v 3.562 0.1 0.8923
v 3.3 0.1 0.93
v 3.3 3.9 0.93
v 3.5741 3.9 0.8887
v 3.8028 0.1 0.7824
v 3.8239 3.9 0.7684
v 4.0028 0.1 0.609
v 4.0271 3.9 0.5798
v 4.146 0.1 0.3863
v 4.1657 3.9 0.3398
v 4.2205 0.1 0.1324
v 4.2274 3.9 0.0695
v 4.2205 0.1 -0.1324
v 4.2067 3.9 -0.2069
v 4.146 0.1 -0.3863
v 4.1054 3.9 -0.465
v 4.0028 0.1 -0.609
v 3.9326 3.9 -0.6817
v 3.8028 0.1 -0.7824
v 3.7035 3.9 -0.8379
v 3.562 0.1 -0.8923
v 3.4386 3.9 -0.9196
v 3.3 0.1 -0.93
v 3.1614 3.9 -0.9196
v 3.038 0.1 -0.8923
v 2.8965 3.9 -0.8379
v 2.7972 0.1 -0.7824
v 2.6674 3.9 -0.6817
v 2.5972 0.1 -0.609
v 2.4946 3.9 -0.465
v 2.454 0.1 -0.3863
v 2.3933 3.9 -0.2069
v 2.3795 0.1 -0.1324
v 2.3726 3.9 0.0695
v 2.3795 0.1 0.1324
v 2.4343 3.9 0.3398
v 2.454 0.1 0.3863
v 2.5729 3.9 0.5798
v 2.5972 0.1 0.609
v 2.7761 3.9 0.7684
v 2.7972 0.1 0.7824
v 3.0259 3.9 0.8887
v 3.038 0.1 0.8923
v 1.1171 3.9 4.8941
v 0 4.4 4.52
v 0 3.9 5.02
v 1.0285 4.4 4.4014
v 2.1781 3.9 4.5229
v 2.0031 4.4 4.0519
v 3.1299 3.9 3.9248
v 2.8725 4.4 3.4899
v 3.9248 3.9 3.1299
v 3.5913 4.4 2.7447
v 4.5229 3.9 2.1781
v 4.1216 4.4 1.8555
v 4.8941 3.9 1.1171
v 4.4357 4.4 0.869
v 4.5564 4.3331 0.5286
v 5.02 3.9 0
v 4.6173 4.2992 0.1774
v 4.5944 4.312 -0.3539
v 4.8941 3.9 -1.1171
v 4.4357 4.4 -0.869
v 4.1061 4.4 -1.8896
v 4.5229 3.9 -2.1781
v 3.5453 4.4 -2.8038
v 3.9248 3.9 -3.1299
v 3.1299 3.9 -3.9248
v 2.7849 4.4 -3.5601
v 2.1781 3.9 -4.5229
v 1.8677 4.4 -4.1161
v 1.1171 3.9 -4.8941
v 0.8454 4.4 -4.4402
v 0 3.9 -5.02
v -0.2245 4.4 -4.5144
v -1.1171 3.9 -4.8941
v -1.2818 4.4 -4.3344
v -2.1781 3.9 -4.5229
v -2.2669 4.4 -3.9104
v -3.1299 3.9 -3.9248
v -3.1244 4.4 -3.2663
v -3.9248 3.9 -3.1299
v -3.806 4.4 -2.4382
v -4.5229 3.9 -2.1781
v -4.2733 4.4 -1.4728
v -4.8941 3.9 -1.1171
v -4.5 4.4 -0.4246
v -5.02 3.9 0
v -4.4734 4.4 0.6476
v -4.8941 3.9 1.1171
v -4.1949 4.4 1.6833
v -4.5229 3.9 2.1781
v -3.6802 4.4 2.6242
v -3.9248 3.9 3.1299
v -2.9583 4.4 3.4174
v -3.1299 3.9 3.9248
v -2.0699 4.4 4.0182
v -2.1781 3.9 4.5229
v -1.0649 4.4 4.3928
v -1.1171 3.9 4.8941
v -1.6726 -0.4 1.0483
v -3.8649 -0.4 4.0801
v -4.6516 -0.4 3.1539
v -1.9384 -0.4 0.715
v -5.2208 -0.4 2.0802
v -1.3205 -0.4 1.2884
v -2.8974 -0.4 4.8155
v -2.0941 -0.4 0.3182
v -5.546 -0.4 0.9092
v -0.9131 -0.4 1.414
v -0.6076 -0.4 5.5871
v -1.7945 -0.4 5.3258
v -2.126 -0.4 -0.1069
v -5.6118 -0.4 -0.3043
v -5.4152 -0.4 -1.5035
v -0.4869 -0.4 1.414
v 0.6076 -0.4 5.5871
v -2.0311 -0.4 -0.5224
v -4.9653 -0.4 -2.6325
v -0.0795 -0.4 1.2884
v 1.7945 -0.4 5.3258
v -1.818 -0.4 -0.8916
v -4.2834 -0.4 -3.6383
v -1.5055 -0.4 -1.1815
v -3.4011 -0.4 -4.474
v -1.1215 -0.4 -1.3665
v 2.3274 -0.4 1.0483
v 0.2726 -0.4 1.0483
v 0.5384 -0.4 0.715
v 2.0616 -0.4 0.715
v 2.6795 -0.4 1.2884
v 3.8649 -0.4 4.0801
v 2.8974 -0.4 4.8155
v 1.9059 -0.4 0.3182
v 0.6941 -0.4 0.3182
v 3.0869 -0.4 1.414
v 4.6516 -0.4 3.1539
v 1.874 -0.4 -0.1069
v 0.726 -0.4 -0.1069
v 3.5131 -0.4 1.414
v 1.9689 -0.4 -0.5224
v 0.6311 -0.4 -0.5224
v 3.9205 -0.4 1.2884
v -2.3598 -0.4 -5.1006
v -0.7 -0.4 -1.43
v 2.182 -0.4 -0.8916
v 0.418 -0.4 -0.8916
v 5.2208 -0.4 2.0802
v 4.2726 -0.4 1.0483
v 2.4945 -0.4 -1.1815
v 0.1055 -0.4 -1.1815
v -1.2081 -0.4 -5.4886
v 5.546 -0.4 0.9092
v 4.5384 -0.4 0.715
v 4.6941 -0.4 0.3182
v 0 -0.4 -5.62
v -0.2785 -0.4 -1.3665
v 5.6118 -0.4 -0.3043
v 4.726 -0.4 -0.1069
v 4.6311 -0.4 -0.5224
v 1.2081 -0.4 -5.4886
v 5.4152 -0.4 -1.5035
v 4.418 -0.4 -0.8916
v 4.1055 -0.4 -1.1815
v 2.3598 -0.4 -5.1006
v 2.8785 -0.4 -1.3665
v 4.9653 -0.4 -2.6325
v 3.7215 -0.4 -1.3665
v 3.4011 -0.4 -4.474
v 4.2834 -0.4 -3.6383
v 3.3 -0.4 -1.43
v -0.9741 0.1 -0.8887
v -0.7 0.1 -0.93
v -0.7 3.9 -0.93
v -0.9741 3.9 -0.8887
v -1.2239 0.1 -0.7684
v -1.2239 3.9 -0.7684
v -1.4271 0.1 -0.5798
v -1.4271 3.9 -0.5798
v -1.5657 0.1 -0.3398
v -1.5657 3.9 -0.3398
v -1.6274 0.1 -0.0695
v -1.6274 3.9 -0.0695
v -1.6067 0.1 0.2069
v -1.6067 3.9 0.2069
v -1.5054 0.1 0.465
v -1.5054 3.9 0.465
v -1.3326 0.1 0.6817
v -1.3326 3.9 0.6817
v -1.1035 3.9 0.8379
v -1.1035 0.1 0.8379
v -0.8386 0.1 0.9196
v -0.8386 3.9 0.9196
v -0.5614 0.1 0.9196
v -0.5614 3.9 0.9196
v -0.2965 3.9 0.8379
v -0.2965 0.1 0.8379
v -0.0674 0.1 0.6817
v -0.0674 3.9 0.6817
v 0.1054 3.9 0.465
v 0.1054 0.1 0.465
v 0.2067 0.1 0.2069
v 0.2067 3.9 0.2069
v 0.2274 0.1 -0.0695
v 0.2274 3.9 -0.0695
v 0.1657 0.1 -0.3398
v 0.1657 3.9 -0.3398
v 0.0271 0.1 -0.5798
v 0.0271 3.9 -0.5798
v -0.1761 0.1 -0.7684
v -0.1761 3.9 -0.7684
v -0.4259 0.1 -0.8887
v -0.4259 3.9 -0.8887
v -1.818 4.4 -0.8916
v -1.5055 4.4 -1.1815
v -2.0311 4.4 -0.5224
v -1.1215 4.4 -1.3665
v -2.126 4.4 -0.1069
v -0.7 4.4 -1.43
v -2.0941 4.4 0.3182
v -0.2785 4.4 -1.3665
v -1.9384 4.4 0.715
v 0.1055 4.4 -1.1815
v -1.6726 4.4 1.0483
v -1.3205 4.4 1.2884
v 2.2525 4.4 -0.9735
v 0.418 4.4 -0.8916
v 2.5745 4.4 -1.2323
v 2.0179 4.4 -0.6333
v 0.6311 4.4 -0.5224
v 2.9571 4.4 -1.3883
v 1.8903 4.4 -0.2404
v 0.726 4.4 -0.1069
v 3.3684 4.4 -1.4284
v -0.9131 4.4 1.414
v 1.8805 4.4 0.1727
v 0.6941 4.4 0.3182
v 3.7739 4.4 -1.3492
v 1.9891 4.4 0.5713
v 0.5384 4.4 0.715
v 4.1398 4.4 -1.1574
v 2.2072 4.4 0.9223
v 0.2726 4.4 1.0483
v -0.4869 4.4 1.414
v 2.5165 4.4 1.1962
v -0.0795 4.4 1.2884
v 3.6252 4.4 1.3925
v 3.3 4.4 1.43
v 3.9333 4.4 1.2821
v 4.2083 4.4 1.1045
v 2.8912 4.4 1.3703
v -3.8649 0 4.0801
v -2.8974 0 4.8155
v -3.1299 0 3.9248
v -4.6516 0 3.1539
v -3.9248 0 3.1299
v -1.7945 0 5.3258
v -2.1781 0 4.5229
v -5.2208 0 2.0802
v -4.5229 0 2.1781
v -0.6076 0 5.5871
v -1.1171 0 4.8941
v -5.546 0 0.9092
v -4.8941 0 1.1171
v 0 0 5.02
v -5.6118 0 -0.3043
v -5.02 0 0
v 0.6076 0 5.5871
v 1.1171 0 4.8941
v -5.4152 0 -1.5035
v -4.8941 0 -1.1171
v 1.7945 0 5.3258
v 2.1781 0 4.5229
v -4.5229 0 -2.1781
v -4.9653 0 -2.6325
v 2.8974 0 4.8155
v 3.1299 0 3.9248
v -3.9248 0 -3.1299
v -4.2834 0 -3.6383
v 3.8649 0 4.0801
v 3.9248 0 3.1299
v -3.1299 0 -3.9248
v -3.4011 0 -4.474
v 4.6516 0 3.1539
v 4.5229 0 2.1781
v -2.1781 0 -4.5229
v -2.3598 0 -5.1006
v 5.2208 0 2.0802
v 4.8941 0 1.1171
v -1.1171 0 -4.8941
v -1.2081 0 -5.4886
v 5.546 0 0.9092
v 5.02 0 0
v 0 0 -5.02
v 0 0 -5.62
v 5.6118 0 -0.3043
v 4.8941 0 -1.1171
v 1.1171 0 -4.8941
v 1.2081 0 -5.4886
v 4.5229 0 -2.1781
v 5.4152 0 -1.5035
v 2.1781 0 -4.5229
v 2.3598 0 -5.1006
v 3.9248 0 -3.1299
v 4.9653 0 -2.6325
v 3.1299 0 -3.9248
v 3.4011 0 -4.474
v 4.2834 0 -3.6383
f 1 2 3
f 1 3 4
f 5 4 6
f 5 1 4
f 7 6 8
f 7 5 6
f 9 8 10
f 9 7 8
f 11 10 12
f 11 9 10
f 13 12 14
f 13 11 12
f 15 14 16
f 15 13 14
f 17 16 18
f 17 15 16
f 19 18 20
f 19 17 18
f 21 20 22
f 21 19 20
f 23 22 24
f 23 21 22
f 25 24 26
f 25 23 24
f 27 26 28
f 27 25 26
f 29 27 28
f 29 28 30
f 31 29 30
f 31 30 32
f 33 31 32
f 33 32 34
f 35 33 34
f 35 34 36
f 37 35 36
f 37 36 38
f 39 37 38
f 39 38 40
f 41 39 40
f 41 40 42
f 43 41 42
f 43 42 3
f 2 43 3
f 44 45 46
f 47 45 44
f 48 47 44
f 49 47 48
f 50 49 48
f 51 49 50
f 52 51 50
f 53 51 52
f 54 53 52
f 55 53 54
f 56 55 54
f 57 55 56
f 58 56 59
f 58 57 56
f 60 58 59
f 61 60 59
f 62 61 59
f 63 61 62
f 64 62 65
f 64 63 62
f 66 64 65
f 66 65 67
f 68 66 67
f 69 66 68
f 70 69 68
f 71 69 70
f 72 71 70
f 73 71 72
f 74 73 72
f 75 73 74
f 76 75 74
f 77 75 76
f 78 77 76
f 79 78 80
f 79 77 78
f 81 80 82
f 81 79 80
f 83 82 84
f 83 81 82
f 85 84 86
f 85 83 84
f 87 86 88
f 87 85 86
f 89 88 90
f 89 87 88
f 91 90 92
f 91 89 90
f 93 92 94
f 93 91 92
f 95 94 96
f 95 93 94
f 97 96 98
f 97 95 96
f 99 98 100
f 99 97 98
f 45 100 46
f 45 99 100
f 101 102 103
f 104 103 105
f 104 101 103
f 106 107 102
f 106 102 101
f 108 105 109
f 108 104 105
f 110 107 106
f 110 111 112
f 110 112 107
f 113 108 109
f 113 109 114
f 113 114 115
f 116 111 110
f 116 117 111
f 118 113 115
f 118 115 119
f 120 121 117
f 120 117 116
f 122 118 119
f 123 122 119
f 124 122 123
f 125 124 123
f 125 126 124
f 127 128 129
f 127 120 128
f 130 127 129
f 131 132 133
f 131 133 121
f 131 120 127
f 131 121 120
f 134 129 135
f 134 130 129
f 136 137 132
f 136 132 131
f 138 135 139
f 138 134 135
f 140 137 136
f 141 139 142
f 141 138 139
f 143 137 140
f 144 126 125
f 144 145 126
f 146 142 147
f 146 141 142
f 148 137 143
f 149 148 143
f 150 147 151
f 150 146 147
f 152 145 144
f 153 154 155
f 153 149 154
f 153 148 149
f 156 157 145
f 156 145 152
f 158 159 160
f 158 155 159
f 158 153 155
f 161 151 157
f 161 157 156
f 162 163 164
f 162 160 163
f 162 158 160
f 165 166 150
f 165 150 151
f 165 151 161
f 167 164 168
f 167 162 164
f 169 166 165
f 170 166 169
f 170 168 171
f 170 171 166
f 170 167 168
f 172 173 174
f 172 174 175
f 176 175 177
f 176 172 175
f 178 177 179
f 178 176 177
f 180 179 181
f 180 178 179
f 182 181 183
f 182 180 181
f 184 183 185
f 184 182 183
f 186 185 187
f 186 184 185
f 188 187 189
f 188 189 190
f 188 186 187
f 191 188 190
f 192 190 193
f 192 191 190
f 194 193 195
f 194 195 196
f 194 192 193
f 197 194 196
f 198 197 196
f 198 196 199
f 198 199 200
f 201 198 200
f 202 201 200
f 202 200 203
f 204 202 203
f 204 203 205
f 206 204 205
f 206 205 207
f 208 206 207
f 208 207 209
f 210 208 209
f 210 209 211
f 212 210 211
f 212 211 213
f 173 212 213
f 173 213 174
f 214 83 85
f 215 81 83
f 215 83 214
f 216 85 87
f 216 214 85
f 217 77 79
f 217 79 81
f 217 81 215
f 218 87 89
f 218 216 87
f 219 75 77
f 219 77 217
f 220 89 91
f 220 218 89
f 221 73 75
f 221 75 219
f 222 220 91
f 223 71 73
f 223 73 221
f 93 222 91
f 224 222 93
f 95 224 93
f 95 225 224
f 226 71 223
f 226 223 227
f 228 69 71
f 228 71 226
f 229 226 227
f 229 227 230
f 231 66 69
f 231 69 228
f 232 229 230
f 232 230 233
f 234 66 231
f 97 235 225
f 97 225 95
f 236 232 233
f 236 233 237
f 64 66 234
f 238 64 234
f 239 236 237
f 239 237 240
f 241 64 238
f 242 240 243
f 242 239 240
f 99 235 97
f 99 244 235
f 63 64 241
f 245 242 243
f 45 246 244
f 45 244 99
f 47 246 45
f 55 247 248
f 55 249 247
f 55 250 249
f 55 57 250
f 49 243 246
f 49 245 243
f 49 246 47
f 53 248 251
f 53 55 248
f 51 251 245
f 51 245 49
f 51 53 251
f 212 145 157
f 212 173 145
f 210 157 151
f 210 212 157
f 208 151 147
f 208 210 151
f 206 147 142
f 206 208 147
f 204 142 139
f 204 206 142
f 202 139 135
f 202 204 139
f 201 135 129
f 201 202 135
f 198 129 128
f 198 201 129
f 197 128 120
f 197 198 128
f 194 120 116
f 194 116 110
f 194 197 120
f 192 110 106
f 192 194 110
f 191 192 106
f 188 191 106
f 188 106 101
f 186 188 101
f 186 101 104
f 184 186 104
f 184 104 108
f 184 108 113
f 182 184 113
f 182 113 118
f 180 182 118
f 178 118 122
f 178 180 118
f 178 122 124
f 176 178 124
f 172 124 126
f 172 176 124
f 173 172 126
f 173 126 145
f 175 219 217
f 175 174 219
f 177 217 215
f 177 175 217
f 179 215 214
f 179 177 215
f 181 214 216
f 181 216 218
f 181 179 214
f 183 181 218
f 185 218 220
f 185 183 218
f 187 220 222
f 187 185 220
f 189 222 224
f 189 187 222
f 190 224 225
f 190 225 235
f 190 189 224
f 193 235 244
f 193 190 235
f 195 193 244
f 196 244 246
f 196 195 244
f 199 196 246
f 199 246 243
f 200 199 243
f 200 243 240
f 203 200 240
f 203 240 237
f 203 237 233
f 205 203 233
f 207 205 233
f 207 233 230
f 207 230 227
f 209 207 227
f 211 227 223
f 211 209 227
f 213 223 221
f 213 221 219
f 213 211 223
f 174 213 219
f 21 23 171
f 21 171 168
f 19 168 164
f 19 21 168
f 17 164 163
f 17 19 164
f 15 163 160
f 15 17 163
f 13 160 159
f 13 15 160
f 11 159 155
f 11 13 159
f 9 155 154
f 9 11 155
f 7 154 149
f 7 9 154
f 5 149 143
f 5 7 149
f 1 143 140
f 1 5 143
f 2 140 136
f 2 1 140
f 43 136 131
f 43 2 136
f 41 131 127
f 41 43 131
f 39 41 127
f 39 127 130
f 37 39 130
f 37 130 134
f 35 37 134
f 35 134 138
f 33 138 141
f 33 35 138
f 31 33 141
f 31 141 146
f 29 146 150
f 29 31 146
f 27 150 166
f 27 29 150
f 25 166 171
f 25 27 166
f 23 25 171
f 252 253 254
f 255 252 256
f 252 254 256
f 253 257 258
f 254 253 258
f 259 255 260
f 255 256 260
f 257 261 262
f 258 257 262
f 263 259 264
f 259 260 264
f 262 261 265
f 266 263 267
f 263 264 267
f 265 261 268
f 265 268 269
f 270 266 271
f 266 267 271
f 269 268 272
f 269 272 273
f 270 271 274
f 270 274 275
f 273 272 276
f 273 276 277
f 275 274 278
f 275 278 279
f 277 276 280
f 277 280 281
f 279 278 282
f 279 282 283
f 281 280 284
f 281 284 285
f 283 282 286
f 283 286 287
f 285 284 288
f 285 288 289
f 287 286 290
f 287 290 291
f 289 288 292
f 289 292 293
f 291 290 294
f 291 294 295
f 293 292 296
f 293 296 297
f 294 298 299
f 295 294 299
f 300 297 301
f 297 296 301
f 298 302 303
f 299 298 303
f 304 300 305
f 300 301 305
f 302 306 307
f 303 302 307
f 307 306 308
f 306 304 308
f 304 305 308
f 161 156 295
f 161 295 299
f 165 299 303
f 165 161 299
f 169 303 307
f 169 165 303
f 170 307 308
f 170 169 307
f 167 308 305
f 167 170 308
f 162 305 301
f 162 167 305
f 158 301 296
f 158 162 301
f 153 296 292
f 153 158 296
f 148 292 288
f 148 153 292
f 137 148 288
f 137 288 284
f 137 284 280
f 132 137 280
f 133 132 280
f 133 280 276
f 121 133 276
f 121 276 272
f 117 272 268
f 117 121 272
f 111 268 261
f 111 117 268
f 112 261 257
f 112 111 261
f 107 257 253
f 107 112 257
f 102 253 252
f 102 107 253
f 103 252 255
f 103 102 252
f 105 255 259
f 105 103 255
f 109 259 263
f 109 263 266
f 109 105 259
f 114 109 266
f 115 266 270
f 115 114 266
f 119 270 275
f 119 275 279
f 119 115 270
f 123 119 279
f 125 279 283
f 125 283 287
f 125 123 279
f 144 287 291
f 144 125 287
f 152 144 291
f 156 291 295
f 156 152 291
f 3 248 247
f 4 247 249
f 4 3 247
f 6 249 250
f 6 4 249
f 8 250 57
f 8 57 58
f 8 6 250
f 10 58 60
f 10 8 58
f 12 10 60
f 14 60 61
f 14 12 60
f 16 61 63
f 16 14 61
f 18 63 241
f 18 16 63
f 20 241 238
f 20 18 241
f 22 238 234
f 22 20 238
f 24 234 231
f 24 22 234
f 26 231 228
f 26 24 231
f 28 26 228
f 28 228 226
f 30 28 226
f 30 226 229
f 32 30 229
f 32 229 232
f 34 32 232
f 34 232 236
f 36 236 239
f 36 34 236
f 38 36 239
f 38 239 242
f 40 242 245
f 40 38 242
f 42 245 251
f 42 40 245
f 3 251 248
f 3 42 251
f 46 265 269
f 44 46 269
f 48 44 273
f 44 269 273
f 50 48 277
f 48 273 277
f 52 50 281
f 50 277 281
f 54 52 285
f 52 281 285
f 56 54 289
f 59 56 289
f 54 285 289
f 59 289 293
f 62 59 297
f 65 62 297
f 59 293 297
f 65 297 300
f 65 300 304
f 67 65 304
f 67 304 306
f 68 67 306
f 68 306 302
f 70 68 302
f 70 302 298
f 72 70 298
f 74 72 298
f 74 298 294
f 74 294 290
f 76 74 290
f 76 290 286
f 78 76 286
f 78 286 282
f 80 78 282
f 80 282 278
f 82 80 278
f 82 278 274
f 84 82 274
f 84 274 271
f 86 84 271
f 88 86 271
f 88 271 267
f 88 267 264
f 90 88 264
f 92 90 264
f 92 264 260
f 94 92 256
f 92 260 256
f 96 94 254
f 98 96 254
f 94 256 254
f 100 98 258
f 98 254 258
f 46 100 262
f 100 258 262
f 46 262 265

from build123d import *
from build123d.topology import SkipClean

# Parameters (mm, degrees)
SKETCH_1_R      = 5.02
SKETCH_1_R_2    = 0.93
EXTRUDE_1_DEPTH = 4.4
EXTRUDE_START   = 0.4
SKETCH_3_R      = 5.62
SKETCH_3_R_2    = 0.93
EXTRUDE_2_DEPTH = 0.4
CHAMFER_1_SIZE  = 0.5


with BuildPart() as part:
    # 草图1 → 凸台-拉伸1 (new body)
    with BuildSketch(Plane(origin=(0, 0, 0), x_dir=(1, 0, 0), z_dir=(0, 1, 0))):
        with Locations(Location((0, 0, 0), (0, 0, 270))):
            Circle(SKETCH_1_R)
        with Locations(Location((3.3, 0, 0), (0, 0, 270))):
            Circle(SKETCH_1_R_2, mode=Mode.SUBTRACT)
        with Locations(Location((-0.7, 0, 0), (0, 0, 90))):
            Circle(SKETCH_1_R_2, mode=Mode.SUBTRACT)
    extrude(amount=EXTRUDE_1_DEPTH)

    # 草图3 → 凸台-拉伸2 (add)
    with SkipClean():  # the faces are left unmerged after this step: merging them gives an invalid solid
        with BuildSketch(Plane.XZ.offset(EXTRUDE_START)):
            with Locations(Location((0, 0, 0), (0, 0, 270))):
                Circle(SKETCH_3_R)
            with Locations(Location((3.3, 0, 0), (0, 0, 270))):
                Circle(SKETCH_3_R_2, mode=Mode.SUBTRACT)
            with Locations(Location((-0.7, 0, 0), (0, 0, 270))):
                Circle(SKETCH_3_R_2, mode=Mode.SUBTRACT)
        extrude(amount=-EXTRUDE_2_DEPTH)

    # 倒角1
    # the kernel refuses this chamfer: 0.5 mm, written as the material it takes off along each edge
    with BuildSketch(Plane(origin=(3.3, -0.4, 0), x_dir=(0, 0, -1), z_dir=(-1, 0, 0))) as chamfer_1_piece_1:
        Polygon((0.93 + CHAMFER_1_SIZE, 0), (0.93, -CHAMFER_1_SIZE), (0.93, 0), align=None)
    revolve(axis=Axis((3.3, -0.4, 0), (0, -1, 0)), mode=Mode.SUBTRACT)
    with BuildSketch(Plane(origin=(-0.7, -0.4, 0), x_dir=(0, 0, -1), z_dir=(-1, 0, 0))) as chamfer_1_piece_2:
        Polygon((0.93 + CHAMFER_1_SIZE, 0), (0.93, -CHAMFER_1_SIZE), (0.93, 0), align=None)
    revolve(axis=Axis((-0.7, -0.4, 0), (0, -1, 0)), mode=Mode.SUBTRACT)
    with BuildSketch(Plane(origin=(0, 4.4, 0), x_dir=(0, 0, 1), z_dir=(-1, 0, 0))) as chamfer_1_piece_3:
        Polygon((5.02, -CHAMFER_1_SIZE), (5.02 - CHAMFER_1_SIZE, 0), (5.02, 0), align=None)
    revolve(axis=Axis((0, 4.4, 0), (0, 1, 0)), mode=Mode.SUBTRACT)
    with BuildSketch(Plane(origin=(3.3, 4.4, 0), x_dir=(0, 0, 1), z_dir=(-1, 0, 0))) as chamfer_1_piece_4:
        Polygon((0.93 + CHAMFER_1_SIZE, 0), (0.93, -CHAMFER_1_SIZE), (0.93, 0), align=None)
    revolve(axis=Axis((3.3, 4.4, 0), (0, 1, 0)), mode=Mode.SUBTRACT)
    with BuildSketch(Plane(origin=(-0.7, 4.4, 0), x_dir=(0, 0, -1), z_dir=(1, 0, 0))) as chamfer_1_piece_5:
        Polygon((0.93 + CHAMFER_1_SIZE, 0), (0.93, -CHAMFER_1_SIZE), (0.93, 0), align=None)
    revolve(axis=Axis((-0.7, 4.4, 0), (0, 1, 0)), mode=Mode.SUBTRACT)


solid = part.part
